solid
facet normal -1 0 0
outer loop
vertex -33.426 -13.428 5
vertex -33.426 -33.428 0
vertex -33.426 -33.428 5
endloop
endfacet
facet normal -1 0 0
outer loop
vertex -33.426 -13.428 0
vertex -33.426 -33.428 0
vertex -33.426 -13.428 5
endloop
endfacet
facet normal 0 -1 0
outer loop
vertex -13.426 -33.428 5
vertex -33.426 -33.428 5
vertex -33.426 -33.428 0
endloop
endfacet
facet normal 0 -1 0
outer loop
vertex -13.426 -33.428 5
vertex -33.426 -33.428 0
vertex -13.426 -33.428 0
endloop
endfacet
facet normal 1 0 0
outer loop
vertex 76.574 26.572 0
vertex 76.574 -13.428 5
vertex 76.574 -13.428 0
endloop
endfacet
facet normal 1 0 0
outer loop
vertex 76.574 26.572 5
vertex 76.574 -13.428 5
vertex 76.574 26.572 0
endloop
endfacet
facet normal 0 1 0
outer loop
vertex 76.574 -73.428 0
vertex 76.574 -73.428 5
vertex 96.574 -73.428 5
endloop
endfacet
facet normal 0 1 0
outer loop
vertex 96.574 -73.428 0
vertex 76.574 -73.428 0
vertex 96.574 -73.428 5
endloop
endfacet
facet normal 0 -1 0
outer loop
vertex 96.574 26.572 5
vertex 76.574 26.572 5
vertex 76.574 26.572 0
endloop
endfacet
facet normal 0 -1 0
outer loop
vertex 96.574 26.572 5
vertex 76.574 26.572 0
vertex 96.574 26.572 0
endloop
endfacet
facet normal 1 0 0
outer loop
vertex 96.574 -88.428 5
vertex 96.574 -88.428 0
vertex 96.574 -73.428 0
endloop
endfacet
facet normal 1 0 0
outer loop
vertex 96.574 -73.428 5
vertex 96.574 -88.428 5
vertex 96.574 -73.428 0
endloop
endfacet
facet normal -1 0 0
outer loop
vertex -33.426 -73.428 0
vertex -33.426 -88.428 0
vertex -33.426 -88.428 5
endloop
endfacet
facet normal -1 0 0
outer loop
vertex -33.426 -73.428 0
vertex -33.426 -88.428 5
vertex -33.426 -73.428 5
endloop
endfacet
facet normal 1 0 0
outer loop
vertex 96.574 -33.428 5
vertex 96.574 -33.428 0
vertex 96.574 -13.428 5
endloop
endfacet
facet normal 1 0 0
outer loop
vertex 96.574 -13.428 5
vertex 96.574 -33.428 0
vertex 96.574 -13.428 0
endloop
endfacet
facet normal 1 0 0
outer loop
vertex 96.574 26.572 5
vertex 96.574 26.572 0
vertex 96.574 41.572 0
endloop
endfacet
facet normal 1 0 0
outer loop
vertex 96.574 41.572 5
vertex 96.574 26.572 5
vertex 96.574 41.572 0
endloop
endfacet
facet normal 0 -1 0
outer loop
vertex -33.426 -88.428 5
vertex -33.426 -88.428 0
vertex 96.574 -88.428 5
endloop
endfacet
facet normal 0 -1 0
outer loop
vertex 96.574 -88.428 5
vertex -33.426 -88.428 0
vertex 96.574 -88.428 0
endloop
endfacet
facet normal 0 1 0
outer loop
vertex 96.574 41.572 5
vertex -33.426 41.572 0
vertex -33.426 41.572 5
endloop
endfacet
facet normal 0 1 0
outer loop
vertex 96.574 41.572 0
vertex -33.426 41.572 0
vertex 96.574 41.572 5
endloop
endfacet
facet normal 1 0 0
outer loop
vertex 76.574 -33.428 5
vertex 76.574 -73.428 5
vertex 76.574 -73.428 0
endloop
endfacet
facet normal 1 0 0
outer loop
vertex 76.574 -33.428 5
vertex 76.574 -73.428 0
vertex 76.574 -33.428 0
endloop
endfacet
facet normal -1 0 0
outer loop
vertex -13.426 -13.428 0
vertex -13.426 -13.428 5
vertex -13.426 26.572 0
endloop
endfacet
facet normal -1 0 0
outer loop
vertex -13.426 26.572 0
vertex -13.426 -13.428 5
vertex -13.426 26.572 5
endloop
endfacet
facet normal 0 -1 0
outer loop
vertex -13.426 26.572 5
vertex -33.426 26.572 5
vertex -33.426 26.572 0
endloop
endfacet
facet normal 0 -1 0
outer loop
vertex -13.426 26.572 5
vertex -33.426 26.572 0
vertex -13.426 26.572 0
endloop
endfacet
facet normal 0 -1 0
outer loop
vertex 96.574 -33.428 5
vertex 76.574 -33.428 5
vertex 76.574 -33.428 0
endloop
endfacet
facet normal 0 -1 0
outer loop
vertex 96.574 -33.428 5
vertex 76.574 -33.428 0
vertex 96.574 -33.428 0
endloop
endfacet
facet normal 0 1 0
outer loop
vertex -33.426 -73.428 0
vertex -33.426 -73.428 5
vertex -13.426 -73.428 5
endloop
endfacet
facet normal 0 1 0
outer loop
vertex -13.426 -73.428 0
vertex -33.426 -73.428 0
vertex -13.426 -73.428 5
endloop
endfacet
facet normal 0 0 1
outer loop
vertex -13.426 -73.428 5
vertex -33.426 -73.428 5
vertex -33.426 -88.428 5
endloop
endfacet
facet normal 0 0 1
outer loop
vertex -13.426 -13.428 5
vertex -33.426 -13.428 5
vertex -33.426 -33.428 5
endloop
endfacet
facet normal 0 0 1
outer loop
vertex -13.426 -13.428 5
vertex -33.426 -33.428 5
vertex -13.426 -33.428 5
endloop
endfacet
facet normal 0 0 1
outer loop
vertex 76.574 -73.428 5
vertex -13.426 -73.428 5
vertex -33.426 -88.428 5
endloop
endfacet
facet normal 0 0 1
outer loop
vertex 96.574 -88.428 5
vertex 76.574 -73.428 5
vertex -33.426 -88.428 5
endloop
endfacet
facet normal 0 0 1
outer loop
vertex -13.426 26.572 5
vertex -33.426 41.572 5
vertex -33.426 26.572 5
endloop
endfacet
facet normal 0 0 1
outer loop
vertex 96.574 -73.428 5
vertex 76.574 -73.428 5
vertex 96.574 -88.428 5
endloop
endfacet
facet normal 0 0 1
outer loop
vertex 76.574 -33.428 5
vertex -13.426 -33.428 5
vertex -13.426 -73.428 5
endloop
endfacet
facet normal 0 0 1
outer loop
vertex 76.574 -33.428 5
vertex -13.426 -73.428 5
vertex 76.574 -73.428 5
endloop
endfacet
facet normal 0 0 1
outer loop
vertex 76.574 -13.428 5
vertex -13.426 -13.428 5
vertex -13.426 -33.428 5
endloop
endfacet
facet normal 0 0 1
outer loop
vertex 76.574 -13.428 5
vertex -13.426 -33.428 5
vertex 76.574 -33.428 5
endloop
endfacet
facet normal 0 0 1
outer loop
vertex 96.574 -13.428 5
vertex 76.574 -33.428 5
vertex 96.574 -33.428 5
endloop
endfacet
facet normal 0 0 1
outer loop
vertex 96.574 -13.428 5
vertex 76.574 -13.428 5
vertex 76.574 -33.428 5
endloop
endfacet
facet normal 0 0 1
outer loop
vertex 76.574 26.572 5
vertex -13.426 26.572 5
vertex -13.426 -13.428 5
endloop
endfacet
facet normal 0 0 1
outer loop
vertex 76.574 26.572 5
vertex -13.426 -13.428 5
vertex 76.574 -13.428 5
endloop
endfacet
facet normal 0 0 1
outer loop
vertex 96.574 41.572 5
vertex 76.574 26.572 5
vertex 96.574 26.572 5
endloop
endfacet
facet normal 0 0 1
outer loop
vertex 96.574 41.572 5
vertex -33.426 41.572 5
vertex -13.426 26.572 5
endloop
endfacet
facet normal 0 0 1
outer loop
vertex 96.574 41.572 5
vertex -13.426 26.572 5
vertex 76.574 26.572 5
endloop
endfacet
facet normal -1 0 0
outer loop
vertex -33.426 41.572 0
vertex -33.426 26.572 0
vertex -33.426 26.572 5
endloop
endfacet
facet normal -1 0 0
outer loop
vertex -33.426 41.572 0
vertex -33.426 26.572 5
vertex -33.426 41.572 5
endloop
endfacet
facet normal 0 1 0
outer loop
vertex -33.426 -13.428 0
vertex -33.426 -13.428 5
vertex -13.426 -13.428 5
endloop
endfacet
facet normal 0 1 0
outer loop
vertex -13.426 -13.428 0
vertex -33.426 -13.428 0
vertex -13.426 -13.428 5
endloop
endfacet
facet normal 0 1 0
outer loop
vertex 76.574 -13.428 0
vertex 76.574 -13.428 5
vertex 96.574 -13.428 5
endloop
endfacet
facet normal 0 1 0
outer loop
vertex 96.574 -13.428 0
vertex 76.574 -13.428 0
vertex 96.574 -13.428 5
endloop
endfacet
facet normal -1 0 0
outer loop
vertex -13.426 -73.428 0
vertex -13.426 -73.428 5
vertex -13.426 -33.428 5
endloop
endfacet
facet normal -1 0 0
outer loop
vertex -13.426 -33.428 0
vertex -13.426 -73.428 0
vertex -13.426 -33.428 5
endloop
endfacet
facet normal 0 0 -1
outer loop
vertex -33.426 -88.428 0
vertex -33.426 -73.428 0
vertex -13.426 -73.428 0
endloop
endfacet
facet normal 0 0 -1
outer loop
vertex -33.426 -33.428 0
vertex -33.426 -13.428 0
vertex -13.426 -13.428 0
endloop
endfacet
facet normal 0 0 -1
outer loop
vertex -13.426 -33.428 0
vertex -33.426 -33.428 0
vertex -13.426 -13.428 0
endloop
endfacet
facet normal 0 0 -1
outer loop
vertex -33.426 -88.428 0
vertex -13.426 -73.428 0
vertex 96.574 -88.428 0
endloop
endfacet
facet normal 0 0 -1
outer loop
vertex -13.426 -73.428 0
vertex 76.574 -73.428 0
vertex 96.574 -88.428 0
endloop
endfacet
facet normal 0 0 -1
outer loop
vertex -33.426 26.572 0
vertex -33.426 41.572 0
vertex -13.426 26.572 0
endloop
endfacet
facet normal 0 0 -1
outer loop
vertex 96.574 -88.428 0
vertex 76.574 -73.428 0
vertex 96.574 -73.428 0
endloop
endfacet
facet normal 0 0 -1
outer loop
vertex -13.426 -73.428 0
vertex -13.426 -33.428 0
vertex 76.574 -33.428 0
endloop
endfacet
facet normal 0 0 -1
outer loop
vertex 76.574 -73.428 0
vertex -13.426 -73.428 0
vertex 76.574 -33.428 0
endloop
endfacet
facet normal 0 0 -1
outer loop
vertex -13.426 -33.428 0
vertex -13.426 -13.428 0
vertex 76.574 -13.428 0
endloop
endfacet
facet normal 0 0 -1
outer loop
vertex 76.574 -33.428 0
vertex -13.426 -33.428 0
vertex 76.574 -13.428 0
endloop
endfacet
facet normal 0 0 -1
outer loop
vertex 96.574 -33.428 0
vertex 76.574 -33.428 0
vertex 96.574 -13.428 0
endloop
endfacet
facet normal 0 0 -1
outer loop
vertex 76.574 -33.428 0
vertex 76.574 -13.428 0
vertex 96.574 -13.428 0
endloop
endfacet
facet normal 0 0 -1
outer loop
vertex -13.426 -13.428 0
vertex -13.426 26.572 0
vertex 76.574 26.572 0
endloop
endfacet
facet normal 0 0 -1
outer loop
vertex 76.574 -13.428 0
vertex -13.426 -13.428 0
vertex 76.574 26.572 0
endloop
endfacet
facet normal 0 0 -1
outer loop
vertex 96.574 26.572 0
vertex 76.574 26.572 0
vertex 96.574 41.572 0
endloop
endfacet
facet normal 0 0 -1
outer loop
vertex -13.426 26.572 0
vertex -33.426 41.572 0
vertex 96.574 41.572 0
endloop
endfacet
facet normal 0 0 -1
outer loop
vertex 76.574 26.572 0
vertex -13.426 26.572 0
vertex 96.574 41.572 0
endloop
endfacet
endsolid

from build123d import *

# Parameters (mm, degrees)
ESQUISSE1_W             = 130
ESQUISSE1_H             = 130
BOSS_EXTRU_1_DEPTH      = 5
ESQUISSE2_W             = 20
ESQUISSE2_H             = 40
ENL_V_MAT_EXTRU_1_DEPTH = 10
ESQUISSE3_W             = 20
ESQUISSE3_H             = 40
ENL_V_MAT_EXTRU_2_DEPTH = 10


with BuildPart() as part:
    # Esquisse1 → Boss.-Extru.1 (new body)
    with BuildSketch(Plane.XY):
        with Locations((31.574099396, -23.428129952)):
            Rectangle(ESQUISSE1_W, ESQUISSE1_H)
    extrude(amount=BOSS_EXTRU_1_DEPTH)

    # Esquisse2 → Enlèv. mat.-Extru.1 (cut)
    with BuildSketch(Plane.XY.offset(5)):
        with Locations((-23.425900604, 6.571870048)):
            Rectangle(ESQUISSE2_W, ESQUISSE2_H)
        with Locations((-23.425900604, -53.428129952)):
            Rectangle(ESQUISSE2_W, ESQUISSE2_H)
    extrude(amount=-ENL_V_MAT_EXTRU_1_DEPTH, mode=Mode.SUBTRACT)

    # Esquisse3 → Enlèv. mat.-Extru.2 (cut)
    with BuildSketch(Plane.XY.offset(5)):
        with Locations((86.574099396, 6.571870048)):
            Rectangle(ESQUISSE3_W, ESQUISSE3_H)
        with Locations((86.574099396, -53.428129952)):
            Rectangle(ESQUISSE3_W, ESQUISSE3_H)
    extrude(amount=-ENL_V_MAT_EXTRU_2_DEPTH, mode=Mode.SUBTRACT)


solid = part.part
